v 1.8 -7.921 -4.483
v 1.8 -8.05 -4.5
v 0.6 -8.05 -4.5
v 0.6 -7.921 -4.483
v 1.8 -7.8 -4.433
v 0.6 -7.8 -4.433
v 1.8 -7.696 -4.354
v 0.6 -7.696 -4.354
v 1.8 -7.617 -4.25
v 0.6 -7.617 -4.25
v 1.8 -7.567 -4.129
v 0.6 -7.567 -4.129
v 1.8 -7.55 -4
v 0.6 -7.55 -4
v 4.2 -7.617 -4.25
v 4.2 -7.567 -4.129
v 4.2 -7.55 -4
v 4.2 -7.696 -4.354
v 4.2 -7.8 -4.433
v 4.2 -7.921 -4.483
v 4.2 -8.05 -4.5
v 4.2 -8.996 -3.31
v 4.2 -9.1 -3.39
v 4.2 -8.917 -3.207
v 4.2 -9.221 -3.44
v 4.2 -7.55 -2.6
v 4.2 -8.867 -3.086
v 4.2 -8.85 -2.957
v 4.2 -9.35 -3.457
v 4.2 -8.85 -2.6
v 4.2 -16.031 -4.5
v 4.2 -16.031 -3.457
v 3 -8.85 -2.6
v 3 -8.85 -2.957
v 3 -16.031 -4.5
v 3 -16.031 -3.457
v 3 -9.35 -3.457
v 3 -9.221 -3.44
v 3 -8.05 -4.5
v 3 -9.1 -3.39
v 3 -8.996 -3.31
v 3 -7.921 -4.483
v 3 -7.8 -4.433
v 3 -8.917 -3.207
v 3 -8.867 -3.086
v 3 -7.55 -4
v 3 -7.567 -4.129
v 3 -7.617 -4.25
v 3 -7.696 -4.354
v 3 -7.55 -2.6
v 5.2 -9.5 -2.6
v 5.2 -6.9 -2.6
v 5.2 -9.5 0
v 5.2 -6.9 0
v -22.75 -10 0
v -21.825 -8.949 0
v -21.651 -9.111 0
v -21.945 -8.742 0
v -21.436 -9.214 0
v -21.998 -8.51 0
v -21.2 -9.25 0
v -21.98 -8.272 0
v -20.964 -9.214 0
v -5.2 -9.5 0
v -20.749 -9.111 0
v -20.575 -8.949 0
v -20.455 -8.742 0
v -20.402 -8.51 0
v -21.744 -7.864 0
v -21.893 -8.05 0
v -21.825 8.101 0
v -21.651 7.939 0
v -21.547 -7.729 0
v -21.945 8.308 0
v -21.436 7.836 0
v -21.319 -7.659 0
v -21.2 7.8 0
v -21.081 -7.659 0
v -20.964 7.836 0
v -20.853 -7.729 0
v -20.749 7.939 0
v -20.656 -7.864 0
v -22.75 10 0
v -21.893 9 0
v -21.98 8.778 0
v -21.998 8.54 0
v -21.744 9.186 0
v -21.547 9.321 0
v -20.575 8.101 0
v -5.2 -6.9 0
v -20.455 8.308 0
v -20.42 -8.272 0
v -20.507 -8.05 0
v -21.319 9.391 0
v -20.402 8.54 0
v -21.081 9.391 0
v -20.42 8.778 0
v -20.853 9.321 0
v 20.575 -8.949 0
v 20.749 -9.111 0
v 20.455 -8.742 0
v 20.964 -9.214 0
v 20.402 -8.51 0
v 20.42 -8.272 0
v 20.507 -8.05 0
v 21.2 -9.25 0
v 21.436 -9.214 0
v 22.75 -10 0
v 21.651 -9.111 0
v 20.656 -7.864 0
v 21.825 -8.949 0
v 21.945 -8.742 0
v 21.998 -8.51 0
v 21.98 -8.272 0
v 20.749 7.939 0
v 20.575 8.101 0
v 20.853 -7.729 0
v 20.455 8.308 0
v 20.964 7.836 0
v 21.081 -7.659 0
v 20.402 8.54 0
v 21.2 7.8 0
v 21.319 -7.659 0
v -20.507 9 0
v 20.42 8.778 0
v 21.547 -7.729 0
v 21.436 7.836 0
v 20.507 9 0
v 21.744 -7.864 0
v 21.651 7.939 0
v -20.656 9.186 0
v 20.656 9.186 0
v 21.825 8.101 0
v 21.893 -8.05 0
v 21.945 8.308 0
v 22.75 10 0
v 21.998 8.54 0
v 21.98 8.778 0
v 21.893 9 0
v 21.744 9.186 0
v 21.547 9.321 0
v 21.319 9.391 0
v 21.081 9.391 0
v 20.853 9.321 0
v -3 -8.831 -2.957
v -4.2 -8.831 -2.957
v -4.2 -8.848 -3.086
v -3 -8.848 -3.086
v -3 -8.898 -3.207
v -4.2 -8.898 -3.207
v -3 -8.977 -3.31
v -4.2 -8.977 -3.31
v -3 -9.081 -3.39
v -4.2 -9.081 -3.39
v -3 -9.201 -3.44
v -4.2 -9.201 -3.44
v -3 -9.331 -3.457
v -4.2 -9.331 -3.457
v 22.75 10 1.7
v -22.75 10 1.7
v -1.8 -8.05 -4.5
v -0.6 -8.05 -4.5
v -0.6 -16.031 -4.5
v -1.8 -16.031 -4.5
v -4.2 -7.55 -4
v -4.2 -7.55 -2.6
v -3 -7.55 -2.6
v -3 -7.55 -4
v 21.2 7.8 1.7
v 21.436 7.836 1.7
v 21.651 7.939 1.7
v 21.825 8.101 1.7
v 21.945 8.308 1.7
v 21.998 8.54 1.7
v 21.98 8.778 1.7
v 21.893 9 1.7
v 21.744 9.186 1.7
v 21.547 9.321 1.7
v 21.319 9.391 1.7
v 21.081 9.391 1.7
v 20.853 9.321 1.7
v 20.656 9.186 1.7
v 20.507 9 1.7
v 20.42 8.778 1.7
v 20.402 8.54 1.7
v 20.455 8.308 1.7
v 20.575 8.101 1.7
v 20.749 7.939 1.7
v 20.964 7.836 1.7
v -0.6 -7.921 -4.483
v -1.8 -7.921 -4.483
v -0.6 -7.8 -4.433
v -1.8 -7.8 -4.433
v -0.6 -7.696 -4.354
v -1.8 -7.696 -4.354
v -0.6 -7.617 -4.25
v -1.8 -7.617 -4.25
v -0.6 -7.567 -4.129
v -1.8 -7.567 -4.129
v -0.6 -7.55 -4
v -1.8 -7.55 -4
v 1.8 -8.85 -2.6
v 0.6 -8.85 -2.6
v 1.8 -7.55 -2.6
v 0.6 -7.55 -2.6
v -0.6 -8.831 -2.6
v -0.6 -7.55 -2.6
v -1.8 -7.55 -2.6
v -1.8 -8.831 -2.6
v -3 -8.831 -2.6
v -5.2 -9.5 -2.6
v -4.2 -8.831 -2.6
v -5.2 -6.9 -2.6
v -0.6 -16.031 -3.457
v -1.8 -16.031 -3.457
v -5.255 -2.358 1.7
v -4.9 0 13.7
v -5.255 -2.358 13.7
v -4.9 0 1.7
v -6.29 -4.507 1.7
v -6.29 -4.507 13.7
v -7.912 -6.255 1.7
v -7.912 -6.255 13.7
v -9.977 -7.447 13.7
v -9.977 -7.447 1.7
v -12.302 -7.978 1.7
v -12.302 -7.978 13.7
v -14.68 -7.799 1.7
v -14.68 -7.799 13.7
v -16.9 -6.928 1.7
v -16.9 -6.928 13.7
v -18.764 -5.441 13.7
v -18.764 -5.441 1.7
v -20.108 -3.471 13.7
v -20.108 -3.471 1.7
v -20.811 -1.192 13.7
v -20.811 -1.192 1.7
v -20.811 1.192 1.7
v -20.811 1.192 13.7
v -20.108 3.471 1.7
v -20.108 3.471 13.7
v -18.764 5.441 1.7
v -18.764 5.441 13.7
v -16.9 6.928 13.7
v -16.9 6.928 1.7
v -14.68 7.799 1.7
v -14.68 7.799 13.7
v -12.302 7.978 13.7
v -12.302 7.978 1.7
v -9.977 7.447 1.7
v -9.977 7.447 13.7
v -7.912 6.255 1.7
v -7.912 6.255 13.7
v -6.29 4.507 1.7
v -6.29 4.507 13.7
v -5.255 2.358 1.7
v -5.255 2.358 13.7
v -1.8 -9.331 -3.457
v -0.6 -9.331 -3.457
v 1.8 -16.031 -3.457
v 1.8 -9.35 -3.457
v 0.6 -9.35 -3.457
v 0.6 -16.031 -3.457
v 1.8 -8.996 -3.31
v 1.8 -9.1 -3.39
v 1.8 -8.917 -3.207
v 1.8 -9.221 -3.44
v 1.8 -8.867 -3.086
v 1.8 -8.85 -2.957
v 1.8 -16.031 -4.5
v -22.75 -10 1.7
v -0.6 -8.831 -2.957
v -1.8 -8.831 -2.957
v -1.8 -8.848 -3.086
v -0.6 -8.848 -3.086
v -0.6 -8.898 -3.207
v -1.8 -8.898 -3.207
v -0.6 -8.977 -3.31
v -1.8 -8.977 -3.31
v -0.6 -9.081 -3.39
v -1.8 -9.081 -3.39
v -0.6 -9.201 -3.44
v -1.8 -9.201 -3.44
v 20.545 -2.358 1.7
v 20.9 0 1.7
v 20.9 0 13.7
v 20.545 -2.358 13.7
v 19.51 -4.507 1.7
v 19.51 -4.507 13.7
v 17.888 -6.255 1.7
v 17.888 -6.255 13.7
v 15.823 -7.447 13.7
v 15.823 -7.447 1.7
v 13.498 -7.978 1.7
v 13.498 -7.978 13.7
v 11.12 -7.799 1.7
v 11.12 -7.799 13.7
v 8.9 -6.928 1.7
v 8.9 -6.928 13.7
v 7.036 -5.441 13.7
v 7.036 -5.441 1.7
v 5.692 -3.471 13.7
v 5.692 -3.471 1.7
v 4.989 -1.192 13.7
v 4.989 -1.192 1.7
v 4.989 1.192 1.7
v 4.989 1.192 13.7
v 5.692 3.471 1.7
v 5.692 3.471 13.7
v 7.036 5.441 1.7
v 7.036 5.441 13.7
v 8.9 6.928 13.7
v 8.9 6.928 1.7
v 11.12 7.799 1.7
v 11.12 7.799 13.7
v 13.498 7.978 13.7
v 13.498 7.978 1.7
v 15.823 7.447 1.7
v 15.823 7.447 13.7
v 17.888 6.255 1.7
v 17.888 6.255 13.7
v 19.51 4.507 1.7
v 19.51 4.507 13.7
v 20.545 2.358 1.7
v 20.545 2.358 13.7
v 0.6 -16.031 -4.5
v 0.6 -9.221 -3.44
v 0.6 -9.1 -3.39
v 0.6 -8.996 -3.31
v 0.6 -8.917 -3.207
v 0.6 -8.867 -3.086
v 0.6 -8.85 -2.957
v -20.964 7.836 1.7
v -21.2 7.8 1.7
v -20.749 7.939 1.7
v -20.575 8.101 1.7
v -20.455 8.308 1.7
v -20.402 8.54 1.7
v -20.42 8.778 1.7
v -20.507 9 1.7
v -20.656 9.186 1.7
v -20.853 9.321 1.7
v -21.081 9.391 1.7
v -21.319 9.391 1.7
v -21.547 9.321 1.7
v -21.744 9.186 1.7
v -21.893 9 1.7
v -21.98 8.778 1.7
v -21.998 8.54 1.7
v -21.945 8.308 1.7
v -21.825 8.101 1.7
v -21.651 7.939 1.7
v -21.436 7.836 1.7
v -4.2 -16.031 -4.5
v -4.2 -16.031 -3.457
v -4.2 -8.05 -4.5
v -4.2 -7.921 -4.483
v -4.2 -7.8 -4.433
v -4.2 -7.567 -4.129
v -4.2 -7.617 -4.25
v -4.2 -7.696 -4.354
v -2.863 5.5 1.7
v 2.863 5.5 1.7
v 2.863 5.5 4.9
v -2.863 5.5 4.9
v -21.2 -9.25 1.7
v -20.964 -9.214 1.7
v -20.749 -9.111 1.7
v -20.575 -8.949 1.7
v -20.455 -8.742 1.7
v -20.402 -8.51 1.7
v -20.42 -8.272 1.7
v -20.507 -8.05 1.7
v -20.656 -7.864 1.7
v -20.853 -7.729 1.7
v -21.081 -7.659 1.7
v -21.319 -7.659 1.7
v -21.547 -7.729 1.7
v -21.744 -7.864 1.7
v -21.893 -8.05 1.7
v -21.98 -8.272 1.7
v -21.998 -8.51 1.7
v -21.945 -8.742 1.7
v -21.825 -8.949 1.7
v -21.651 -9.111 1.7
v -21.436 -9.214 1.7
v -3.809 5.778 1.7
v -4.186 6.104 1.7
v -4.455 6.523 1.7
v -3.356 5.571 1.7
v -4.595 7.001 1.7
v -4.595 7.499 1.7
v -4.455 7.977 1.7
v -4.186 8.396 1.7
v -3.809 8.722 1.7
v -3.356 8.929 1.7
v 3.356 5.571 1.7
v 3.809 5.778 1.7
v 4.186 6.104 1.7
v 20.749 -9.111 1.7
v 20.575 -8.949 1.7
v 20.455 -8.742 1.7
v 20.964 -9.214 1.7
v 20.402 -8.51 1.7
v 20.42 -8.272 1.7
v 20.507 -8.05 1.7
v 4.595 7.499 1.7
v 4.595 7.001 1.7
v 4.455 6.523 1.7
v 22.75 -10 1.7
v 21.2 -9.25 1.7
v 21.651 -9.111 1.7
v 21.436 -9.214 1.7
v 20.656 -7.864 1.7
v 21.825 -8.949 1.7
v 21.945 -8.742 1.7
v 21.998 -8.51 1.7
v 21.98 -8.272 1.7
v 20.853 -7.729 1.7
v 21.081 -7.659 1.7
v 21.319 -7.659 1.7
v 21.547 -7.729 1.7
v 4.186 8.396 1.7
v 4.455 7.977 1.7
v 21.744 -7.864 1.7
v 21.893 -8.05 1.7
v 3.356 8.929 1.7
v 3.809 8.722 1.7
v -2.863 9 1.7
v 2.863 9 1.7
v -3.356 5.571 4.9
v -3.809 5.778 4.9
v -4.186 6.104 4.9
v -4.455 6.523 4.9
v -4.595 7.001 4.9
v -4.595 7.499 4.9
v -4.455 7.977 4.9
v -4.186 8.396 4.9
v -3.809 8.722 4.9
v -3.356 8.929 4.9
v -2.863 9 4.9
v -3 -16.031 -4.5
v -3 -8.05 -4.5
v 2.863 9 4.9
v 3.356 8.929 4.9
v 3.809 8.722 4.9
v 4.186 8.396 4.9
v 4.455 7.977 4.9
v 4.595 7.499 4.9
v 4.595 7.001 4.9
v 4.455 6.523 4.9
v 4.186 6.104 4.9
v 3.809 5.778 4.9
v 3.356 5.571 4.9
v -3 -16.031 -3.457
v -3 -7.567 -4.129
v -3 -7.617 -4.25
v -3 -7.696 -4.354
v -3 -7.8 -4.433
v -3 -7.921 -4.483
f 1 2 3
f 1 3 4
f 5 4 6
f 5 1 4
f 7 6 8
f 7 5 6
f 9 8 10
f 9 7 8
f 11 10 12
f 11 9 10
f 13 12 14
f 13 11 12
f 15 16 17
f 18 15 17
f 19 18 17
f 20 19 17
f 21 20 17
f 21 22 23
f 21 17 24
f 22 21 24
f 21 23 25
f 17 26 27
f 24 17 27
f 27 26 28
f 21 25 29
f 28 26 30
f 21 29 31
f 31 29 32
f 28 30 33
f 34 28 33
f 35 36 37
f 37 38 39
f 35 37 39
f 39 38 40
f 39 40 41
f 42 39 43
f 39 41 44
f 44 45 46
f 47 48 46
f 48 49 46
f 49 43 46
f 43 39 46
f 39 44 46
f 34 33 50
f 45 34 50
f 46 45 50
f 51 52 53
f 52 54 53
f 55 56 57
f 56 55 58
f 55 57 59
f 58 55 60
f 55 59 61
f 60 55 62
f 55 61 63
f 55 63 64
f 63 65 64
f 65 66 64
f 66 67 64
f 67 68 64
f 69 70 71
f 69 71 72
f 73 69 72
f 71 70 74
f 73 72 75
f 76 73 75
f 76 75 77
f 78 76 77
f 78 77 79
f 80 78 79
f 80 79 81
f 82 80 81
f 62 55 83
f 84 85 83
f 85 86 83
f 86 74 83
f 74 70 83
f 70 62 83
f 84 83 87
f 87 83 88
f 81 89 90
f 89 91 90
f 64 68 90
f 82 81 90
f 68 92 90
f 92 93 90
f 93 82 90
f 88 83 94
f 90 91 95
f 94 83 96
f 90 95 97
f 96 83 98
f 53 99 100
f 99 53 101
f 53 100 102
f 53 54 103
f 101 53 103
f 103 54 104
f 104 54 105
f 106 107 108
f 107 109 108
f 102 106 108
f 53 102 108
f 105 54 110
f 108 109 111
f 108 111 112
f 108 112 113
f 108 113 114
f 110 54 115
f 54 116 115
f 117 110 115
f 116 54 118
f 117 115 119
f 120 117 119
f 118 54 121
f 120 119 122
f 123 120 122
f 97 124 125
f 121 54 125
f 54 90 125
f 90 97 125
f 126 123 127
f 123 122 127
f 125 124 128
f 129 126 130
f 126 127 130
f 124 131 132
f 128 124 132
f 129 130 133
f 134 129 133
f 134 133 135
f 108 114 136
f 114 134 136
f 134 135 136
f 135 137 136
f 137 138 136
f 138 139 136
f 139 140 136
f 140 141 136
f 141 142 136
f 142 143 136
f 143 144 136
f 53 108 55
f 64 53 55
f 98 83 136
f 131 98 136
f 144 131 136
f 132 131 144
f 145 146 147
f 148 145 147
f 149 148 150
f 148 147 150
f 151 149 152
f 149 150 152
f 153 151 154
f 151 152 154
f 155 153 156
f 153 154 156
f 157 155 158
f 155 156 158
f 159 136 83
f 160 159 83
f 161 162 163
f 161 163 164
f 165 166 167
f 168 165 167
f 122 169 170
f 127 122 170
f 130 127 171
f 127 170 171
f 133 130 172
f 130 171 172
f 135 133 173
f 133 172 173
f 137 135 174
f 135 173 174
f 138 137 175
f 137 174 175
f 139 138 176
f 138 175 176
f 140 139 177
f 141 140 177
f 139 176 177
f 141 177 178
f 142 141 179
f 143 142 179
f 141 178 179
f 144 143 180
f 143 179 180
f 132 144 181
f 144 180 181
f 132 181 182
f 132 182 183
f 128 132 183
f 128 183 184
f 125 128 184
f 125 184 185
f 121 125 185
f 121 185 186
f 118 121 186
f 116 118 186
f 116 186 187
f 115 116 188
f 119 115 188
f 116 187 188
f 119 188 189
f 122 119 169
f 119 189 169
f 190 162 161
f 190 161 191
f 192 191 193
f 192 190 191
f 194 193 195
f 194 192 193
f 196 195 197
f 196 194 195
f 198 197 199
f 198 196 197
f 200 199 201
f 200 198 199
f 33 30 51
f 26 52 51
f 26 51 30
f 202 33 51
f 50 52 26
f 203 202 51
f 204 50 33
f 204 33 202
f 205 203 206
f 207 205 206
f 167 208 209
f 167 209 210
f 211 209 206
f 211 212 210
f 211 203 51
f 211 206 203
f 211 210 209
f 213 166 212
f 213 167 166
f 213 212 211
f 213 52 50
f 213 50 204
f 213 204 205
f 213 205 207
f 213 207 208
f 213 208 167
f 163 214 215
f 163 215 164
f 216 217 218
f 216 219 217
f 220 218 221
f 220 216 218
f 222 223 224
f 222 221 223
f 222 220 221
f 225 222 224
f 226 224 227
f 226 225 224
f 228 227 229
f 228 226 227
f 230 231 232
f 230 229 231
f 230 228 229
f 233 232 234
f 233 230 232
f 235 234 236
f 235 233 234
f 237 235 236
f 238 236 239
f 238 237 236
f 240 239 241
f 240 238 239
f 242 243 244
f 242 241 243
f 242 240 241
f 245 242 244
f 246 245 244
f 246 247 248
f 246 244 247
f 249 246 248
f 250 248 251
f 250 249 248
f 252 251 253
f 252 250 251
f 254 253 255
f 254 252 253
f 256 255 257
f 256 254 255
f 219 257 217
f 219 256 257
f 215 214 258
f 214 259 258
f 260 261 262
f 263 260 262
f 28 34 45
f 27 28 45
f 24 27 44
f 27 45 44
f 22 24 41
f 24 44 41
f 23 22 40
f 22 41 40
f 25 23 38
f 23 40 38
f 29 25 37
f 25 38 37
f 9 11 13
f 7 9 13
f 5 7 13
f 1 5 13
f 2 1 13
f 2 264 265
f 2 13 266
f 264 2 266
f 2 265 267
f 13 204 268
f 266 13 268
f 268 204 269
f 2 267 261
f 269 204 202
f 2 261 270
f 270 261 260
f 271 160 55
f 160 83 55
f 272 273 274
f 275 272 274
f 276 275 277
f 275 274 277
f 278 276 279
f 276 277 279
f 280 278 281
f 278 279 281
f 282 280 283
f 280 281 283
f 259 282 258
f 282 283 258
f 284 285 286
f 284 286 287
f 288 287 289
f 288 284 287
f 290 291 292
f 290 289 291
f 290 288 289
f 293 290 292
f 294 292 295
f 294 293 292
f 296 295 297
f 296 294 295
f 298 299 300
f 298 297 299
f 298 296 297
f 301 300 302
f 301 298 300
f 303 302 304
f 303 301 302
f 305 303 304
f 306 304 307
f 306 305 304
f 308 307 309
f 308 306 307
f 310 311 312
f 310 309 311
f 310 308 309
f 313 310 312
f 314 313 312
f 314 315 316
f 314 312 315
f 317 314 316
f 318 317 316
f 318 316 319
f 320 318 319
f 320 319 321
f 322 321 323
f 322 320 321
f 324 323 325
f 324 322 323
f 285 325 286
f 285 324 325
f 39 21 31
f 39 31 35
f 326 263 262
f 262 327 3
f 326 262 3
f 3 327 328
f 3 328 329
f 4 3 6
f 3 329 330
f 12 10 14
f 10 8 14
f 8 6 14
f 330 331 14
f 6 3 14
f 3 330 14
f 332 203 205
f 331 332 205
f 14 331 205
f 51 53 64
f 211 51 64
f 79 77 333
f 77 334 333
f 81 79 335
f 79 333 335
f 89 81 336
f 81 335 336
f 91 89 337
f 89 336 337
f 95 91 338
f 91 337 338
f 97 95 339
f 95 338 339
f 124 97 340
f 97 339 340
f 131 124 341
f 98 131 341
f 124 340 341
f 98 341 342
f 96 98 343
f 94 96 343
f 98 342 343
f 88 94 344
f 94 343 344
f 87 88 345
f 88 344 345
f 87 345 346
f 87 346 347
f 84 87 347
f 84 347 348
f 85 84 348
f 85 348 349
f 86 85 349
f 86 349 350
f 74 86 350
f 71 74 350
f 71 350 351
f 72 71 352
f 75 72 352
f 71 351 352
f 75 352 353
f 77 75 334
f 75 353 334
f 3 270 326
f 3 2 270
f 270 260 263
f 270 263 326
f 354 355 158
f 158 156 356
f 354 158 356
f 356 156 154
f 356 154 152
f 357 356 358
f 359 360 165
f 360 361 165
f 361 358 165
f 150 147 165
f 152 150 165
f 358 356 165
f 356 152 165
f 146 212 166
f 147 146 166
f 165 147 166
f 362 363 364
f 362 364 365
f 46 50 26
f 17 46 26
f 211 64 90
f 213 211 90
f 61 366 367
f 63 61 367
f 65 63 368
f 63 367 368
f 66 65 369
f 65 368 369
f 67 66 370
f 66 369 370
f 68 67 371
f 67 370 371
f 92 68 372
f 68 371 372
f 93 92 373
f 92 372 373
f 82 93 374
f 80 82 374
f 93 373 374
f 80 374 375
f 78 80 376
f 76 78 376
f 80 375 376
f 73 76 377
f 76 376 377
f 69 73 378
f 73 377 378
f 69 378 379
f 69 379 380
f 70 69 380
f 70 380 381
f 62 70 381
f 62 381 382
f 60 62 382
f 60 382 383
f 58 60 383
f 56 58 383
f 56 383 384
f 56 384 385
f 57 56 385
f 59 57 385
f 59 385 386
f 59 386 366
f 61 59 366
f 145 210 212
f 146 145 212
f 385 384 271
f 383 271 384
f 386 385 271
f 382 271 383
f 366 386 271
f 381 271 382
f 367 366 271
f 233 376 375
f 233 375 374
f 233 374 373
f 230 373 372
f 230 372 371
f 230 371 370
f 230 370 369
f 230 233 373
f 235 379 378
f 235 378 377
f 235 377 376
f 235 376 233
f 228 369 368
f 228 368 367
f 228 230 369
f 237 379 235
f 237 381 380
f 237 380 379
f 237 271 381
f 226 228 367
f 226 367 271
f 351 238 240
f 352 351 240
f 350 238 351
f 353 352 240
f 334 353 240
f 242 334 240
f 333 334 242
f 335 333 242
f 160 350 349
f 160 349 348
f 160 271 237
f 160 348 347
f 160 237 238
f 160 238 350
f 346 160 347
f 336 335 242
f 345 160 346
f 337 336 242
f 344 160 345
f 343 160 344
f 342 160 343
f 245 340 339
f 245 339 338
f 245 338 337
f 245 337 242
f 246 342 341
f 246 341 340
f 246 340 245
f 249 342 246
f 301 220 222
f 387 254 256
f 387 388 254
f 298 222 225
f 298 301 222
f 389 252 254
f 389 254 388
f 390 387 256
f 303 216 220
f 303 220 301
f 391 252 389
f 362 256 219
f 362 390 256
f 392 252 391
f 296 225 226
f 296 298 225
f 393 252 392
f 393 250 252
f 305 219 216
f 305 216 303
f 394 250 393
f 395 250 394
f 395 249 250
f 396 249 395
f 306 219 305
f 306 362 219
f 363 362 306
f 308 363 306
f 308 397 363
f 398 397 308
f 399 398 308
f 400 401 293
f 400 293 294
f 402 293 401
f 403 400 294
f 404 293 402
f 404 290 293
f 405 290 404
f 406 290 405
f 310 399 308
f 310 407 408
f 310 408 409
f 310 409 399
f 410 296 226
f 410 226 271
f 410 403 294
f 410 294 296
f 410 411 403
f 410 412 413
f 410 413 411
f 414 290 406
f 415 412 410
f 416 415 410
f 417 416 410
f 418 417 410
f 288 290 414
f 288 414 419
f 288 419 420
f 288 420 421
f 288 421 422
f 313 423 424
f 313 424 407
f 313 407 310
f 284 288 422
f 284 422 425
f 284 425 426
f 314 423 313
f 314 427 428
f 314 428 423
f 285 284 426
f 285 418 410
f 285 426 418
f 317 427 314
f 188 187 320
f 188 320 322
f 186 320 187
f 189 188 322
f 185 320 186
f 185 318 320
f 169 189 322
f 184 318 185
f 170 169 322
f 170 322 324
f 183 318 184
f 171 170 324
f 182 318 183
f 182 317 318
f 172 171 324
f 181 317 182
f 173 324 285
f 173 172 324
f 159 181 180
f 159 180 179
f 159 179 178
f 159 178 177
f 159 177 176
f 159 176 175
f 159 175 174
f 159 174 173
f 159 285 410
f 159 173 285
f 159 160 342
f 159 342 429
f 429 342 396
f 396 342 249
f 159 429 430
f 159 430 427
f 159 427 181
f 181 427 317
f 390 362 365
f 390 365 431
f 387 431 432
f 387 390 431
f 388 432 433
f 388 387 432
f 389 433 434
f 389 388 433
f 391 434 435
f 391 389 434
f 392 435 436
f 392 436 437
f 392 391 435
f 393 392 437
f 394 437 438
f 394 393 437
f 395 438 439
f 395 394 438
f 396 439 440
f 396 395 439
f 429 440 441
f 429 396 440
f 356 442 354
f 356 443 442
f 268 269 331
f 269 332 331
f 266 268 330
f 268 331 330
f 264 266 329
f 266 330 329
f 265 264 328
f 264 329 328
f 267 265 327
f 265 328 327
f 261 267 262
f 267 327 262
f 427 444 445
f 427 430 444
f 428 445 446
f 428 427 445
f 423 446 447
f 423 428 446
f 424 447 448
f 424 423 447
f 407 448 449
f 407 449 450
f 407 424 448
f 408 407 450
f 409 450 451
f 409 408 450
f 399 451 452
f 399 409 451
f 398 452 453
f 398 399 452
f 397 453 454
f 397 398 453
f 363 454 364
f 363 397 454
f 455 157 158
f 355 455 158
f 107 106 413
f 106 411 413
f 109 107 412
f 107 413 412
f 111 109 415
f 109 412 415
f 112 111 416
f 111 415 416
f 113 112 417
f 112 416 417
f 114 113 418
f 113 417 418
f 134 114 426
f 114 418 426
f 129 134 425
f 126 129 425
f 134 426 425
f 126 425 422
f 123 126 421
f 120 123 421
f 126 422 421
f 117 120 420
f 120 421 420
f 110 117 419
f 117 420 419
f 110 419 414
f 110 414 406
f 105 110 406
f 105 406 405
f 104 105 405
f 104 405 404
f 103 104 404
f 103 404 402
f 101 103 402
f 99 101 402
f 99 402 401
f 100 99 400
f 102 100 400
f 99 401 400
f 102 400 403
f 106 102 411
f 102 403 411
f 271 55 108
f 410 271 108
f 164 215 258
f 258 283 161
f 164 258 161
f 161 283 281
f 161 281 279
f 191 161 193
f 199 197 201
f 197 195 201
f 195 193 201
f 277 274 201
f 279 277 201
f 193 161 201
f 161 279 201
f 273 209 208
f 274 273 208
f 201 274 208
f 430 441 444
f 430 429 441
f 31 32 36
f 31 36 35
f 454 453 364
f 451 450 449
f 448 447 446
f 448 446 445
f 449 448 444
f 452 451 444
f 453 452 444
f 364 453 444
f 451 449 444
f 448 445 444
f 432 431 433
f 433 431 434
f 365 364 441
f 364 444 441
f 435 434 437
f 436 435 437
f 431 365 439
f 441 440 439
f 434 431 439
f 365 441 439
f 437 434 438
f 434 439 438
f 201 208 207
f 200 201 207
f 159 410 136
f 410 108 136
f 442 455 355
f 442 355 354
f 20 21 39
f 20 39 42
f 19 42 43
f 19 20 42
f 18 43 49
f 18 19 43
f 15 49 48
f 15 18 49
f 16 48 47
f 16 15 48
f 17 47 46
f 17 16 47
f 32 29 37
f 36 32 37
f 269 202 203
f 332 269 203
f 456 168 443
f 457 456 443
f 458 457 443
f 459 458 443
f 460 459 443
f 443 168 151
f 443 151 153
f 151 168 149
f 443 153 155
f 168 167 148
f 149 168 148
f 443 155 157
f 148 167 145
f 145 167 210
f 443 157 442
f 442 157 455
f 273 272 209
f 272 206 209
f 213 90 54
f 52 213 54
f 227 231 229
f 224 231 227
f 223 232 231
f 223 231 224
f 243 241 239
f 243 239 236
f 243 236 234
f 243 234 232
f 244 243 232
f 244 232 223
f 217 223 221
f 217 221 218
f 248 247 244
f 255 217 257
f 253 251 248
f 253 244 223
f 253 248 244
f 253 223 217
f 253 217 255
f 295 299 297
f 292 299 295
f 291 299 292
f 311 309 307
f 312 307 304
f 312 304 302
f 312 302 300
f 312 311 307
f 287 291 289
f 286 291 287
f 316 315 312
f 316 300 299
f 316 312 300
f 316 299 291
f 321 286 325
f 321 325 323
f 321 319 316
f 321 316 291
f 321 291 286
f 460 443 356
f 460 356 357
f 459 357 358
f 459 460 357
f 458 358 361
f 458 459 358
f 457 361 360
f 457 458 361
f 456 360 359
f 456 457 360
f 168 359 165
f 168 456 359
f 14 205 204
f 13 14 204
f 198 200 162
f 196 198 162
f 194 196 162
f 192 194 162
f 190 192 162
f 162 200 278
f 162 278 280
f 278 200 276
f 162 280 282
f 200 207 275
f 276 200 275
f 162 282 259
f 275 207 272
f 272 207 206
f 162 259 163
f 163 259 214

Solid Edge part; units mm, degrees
sketch "Sketch1" plane through (0, 0, 0) normal (0, 0, 1) x (1, 0, 0)
  line L0 (-22.75, -10) -> (22.75, -10)
  line L1 (22.75, -10) -> (22.75, 10)
  line L2 (22.75, 10) -> (-22.75, 10)
  line L3 (-22.75, 10) -> (-22.75, -10)
  dimension "D1" = 20
  dimension "D2" = 45.5
extrude "Protrusion1" add sketch "Sketch1" along normal blind 1.7
sketch "Sketch2" plane through (0, 0, 1.7) normal (0, 0, 1) x (1, 0, 0)
  circle A0 centre (-12.9, 0) radius 8
  circle A1 centre (12.9, 0) radius 8
  dimension "D1" = 16
  dimension "D2" = 16
  dimension "D3" = 25.8
extrude "ProtrusiónExtruida_2" add sketch "Sketch2" along normal blind 12
sketch "Sketch3" plane through (0, 0, 1.7) normal (0, 0, 1) x (1, 0, 0)
  line L0 (-2.8632, 9) -> (2.8632, 9)
  arc A0 (2.8632, 9) -> (2.8632, 5.5) centre (2.8632, 7.25) cw
  line L1 (2.8632, 5.5) -> (-2.8632, 5.5)
  arc A1 (-2.8632, 5.5) -> (-2.8632, 9) centre (-2.8632, 7.25) cw
  dimension "D1" = 1.75
  dimension "D2" = 19
extrude "ProtrusiónExtruida_3" add sketch "Sketch3" along normal blind 3.2
sketch "Sketch4" plane through (0, 0, 0) normal (0, 0, -1) x (-1, 0, 0)
  line L0 (-5.2, -9.5) -> (5.2, -9.5)
  line L1 (5.2, -9.5) -> (5.2, -6.9)
  line L2 (5.2, -6.9) -> (-5.2, -6.9)
  line L3 (-5.2, -6.9) -> (-5.2, -9.5)
  dimension "D1" = 2.6
  dimension "D2" = 10.4
  dimension "D3" = 0.5
extrude "ProtrusiónExtruida_6" add sketch "Sketch4" along normal blind 2.6
sketch "Sketch5" plane through (0, -8.2, -2.6) normal (0, 0, -1) x (-1, 0, 0)
  line L0 (-4.2, -0.65) -> (-3, -0.65)
  line L1 (-3, -0.65) -> (-3, 0.65)
  line L2 (-3, 0.65) -> (-4.2, 0.65)
  line L3 (-4.2, 0.65) -> (-4.2, -0.65)
  line L4 (-1.8, -0.65) -> (-0.6, -0.65)
  line L5 (-0.6, -0.65) -> (-0.6, 0.65)
  line L6 (-0.6, 0.65) -> (-1.8, 0.65)
  line L7 (-1.8, 0.65) -> (-1.8, -0.65)
  line L8 (0.6, -0.6308) -> (1.8, -0.6308)
  line L9 (1.8, -0.6308) -> (1.8, 0.65)
  line L10 (1.8, 0.65) -> (0.6, 0.65)
  line L11 (0.6, 0.65) -> (0.6, -0.6308)
  line L12 (3, -0.6308) -> (4.2, -0.6308)
  line L13 (4.2, -0.6308) -> (4.2, 0.65)
  line L14 (4.2, 0.65) -> (3, 0.65)
  line L15 (3, 0.65) -> (3, -0.6308)
  dimension "D1" = 1.2
  dimension "D2" = 1.3
  dimension "D3" = 1.2
  dimension "D4" = 1.2
  dimension "D5" = 1.2
  dimension "D6" = 1
  dimension "D7" = 1
extrude "ProtrusiónExtruida_8" add sketch "Sketch5" along normal blind 1.9
sketch "Sketch6" plane through (-3.6, -8.8308, -3.55) normal (0, -1, 0) x (-1, 0, 0)
  line L0 (-7.8, -0.0931) -> (-6.6, -0.0931)
  line L1 (-6.6, -0.0931) -> (-6.6, 0.95)
  line L2 (-6.6, 0.95) -> (-7.8, 0.95)
  line L3 (-7.8, 0.95) -> (-7.8, -0.0931)
  line L4 (-5.4, -0.0931) -> (-4.2, -0.0931)
  line L5 (-4.2, -0.0931) -> (-4.2, 0.95)
  line L6 (-4.2, 0.95) -> (-5.4, 0.95)
  line L7 (-5.4, 0.95) -> (-5.4, -0.0931)
  line L8 (-3, -0.0931) -> (-1.8, -0.0931)
  line L9 (-1.8, -0.0931) -> (-1.8, 0.95)
  line L10 (-1.8, 0.95) -> (-3, 0.95)
  line L11 (-3, 0.95) -> (-3, -0.0931)
  line L12 (-0.6, -0.0931) -> (0.6, -0.0931)
  line L13 (0.6, -0.0931) -> (0.6, 0.95)
  line L14 (0.6, 0.95) -> (-0.6, 0.95)
  line L15 (-0.6, 0.95) -> (-0.6, -0.0931)
extrude "ProtrusiónExtruida_9" add sketch "Sketch6" along normal blind 7.2
fillet "Redondeo_1" radius 0.5 8 edges at (3.6, -7.55, -4.5) (1.2, -7.55, -4.5) (-1.2, -7.55, -4.5) (-3.6, -7.55, -4.5) (3.6, -8.85, -3.4569) (1.2, -8.85, -3.4569) (-1.2, -8.8308, -3.4569) (-3.6, -8.8308, -3.4569)
hole "Agujero_1" at (-21.2, 8.6, 1.7) direction (0, 0, -1) diameter 1.6 end up to next
hole "Hole1" at (-21.2, -8.45, 1.7) direction (0, 0, -1) diameter 1.6 end up to next
hole "Hole2" at (21.2, 8.6, 1.7) direction (0, 0, -1) diameter 1.6 end up to next
hole "Hole3" at (21.2, -8.45, 1.7) direction (0, 0, -1) diameter 1.6 end up to next
